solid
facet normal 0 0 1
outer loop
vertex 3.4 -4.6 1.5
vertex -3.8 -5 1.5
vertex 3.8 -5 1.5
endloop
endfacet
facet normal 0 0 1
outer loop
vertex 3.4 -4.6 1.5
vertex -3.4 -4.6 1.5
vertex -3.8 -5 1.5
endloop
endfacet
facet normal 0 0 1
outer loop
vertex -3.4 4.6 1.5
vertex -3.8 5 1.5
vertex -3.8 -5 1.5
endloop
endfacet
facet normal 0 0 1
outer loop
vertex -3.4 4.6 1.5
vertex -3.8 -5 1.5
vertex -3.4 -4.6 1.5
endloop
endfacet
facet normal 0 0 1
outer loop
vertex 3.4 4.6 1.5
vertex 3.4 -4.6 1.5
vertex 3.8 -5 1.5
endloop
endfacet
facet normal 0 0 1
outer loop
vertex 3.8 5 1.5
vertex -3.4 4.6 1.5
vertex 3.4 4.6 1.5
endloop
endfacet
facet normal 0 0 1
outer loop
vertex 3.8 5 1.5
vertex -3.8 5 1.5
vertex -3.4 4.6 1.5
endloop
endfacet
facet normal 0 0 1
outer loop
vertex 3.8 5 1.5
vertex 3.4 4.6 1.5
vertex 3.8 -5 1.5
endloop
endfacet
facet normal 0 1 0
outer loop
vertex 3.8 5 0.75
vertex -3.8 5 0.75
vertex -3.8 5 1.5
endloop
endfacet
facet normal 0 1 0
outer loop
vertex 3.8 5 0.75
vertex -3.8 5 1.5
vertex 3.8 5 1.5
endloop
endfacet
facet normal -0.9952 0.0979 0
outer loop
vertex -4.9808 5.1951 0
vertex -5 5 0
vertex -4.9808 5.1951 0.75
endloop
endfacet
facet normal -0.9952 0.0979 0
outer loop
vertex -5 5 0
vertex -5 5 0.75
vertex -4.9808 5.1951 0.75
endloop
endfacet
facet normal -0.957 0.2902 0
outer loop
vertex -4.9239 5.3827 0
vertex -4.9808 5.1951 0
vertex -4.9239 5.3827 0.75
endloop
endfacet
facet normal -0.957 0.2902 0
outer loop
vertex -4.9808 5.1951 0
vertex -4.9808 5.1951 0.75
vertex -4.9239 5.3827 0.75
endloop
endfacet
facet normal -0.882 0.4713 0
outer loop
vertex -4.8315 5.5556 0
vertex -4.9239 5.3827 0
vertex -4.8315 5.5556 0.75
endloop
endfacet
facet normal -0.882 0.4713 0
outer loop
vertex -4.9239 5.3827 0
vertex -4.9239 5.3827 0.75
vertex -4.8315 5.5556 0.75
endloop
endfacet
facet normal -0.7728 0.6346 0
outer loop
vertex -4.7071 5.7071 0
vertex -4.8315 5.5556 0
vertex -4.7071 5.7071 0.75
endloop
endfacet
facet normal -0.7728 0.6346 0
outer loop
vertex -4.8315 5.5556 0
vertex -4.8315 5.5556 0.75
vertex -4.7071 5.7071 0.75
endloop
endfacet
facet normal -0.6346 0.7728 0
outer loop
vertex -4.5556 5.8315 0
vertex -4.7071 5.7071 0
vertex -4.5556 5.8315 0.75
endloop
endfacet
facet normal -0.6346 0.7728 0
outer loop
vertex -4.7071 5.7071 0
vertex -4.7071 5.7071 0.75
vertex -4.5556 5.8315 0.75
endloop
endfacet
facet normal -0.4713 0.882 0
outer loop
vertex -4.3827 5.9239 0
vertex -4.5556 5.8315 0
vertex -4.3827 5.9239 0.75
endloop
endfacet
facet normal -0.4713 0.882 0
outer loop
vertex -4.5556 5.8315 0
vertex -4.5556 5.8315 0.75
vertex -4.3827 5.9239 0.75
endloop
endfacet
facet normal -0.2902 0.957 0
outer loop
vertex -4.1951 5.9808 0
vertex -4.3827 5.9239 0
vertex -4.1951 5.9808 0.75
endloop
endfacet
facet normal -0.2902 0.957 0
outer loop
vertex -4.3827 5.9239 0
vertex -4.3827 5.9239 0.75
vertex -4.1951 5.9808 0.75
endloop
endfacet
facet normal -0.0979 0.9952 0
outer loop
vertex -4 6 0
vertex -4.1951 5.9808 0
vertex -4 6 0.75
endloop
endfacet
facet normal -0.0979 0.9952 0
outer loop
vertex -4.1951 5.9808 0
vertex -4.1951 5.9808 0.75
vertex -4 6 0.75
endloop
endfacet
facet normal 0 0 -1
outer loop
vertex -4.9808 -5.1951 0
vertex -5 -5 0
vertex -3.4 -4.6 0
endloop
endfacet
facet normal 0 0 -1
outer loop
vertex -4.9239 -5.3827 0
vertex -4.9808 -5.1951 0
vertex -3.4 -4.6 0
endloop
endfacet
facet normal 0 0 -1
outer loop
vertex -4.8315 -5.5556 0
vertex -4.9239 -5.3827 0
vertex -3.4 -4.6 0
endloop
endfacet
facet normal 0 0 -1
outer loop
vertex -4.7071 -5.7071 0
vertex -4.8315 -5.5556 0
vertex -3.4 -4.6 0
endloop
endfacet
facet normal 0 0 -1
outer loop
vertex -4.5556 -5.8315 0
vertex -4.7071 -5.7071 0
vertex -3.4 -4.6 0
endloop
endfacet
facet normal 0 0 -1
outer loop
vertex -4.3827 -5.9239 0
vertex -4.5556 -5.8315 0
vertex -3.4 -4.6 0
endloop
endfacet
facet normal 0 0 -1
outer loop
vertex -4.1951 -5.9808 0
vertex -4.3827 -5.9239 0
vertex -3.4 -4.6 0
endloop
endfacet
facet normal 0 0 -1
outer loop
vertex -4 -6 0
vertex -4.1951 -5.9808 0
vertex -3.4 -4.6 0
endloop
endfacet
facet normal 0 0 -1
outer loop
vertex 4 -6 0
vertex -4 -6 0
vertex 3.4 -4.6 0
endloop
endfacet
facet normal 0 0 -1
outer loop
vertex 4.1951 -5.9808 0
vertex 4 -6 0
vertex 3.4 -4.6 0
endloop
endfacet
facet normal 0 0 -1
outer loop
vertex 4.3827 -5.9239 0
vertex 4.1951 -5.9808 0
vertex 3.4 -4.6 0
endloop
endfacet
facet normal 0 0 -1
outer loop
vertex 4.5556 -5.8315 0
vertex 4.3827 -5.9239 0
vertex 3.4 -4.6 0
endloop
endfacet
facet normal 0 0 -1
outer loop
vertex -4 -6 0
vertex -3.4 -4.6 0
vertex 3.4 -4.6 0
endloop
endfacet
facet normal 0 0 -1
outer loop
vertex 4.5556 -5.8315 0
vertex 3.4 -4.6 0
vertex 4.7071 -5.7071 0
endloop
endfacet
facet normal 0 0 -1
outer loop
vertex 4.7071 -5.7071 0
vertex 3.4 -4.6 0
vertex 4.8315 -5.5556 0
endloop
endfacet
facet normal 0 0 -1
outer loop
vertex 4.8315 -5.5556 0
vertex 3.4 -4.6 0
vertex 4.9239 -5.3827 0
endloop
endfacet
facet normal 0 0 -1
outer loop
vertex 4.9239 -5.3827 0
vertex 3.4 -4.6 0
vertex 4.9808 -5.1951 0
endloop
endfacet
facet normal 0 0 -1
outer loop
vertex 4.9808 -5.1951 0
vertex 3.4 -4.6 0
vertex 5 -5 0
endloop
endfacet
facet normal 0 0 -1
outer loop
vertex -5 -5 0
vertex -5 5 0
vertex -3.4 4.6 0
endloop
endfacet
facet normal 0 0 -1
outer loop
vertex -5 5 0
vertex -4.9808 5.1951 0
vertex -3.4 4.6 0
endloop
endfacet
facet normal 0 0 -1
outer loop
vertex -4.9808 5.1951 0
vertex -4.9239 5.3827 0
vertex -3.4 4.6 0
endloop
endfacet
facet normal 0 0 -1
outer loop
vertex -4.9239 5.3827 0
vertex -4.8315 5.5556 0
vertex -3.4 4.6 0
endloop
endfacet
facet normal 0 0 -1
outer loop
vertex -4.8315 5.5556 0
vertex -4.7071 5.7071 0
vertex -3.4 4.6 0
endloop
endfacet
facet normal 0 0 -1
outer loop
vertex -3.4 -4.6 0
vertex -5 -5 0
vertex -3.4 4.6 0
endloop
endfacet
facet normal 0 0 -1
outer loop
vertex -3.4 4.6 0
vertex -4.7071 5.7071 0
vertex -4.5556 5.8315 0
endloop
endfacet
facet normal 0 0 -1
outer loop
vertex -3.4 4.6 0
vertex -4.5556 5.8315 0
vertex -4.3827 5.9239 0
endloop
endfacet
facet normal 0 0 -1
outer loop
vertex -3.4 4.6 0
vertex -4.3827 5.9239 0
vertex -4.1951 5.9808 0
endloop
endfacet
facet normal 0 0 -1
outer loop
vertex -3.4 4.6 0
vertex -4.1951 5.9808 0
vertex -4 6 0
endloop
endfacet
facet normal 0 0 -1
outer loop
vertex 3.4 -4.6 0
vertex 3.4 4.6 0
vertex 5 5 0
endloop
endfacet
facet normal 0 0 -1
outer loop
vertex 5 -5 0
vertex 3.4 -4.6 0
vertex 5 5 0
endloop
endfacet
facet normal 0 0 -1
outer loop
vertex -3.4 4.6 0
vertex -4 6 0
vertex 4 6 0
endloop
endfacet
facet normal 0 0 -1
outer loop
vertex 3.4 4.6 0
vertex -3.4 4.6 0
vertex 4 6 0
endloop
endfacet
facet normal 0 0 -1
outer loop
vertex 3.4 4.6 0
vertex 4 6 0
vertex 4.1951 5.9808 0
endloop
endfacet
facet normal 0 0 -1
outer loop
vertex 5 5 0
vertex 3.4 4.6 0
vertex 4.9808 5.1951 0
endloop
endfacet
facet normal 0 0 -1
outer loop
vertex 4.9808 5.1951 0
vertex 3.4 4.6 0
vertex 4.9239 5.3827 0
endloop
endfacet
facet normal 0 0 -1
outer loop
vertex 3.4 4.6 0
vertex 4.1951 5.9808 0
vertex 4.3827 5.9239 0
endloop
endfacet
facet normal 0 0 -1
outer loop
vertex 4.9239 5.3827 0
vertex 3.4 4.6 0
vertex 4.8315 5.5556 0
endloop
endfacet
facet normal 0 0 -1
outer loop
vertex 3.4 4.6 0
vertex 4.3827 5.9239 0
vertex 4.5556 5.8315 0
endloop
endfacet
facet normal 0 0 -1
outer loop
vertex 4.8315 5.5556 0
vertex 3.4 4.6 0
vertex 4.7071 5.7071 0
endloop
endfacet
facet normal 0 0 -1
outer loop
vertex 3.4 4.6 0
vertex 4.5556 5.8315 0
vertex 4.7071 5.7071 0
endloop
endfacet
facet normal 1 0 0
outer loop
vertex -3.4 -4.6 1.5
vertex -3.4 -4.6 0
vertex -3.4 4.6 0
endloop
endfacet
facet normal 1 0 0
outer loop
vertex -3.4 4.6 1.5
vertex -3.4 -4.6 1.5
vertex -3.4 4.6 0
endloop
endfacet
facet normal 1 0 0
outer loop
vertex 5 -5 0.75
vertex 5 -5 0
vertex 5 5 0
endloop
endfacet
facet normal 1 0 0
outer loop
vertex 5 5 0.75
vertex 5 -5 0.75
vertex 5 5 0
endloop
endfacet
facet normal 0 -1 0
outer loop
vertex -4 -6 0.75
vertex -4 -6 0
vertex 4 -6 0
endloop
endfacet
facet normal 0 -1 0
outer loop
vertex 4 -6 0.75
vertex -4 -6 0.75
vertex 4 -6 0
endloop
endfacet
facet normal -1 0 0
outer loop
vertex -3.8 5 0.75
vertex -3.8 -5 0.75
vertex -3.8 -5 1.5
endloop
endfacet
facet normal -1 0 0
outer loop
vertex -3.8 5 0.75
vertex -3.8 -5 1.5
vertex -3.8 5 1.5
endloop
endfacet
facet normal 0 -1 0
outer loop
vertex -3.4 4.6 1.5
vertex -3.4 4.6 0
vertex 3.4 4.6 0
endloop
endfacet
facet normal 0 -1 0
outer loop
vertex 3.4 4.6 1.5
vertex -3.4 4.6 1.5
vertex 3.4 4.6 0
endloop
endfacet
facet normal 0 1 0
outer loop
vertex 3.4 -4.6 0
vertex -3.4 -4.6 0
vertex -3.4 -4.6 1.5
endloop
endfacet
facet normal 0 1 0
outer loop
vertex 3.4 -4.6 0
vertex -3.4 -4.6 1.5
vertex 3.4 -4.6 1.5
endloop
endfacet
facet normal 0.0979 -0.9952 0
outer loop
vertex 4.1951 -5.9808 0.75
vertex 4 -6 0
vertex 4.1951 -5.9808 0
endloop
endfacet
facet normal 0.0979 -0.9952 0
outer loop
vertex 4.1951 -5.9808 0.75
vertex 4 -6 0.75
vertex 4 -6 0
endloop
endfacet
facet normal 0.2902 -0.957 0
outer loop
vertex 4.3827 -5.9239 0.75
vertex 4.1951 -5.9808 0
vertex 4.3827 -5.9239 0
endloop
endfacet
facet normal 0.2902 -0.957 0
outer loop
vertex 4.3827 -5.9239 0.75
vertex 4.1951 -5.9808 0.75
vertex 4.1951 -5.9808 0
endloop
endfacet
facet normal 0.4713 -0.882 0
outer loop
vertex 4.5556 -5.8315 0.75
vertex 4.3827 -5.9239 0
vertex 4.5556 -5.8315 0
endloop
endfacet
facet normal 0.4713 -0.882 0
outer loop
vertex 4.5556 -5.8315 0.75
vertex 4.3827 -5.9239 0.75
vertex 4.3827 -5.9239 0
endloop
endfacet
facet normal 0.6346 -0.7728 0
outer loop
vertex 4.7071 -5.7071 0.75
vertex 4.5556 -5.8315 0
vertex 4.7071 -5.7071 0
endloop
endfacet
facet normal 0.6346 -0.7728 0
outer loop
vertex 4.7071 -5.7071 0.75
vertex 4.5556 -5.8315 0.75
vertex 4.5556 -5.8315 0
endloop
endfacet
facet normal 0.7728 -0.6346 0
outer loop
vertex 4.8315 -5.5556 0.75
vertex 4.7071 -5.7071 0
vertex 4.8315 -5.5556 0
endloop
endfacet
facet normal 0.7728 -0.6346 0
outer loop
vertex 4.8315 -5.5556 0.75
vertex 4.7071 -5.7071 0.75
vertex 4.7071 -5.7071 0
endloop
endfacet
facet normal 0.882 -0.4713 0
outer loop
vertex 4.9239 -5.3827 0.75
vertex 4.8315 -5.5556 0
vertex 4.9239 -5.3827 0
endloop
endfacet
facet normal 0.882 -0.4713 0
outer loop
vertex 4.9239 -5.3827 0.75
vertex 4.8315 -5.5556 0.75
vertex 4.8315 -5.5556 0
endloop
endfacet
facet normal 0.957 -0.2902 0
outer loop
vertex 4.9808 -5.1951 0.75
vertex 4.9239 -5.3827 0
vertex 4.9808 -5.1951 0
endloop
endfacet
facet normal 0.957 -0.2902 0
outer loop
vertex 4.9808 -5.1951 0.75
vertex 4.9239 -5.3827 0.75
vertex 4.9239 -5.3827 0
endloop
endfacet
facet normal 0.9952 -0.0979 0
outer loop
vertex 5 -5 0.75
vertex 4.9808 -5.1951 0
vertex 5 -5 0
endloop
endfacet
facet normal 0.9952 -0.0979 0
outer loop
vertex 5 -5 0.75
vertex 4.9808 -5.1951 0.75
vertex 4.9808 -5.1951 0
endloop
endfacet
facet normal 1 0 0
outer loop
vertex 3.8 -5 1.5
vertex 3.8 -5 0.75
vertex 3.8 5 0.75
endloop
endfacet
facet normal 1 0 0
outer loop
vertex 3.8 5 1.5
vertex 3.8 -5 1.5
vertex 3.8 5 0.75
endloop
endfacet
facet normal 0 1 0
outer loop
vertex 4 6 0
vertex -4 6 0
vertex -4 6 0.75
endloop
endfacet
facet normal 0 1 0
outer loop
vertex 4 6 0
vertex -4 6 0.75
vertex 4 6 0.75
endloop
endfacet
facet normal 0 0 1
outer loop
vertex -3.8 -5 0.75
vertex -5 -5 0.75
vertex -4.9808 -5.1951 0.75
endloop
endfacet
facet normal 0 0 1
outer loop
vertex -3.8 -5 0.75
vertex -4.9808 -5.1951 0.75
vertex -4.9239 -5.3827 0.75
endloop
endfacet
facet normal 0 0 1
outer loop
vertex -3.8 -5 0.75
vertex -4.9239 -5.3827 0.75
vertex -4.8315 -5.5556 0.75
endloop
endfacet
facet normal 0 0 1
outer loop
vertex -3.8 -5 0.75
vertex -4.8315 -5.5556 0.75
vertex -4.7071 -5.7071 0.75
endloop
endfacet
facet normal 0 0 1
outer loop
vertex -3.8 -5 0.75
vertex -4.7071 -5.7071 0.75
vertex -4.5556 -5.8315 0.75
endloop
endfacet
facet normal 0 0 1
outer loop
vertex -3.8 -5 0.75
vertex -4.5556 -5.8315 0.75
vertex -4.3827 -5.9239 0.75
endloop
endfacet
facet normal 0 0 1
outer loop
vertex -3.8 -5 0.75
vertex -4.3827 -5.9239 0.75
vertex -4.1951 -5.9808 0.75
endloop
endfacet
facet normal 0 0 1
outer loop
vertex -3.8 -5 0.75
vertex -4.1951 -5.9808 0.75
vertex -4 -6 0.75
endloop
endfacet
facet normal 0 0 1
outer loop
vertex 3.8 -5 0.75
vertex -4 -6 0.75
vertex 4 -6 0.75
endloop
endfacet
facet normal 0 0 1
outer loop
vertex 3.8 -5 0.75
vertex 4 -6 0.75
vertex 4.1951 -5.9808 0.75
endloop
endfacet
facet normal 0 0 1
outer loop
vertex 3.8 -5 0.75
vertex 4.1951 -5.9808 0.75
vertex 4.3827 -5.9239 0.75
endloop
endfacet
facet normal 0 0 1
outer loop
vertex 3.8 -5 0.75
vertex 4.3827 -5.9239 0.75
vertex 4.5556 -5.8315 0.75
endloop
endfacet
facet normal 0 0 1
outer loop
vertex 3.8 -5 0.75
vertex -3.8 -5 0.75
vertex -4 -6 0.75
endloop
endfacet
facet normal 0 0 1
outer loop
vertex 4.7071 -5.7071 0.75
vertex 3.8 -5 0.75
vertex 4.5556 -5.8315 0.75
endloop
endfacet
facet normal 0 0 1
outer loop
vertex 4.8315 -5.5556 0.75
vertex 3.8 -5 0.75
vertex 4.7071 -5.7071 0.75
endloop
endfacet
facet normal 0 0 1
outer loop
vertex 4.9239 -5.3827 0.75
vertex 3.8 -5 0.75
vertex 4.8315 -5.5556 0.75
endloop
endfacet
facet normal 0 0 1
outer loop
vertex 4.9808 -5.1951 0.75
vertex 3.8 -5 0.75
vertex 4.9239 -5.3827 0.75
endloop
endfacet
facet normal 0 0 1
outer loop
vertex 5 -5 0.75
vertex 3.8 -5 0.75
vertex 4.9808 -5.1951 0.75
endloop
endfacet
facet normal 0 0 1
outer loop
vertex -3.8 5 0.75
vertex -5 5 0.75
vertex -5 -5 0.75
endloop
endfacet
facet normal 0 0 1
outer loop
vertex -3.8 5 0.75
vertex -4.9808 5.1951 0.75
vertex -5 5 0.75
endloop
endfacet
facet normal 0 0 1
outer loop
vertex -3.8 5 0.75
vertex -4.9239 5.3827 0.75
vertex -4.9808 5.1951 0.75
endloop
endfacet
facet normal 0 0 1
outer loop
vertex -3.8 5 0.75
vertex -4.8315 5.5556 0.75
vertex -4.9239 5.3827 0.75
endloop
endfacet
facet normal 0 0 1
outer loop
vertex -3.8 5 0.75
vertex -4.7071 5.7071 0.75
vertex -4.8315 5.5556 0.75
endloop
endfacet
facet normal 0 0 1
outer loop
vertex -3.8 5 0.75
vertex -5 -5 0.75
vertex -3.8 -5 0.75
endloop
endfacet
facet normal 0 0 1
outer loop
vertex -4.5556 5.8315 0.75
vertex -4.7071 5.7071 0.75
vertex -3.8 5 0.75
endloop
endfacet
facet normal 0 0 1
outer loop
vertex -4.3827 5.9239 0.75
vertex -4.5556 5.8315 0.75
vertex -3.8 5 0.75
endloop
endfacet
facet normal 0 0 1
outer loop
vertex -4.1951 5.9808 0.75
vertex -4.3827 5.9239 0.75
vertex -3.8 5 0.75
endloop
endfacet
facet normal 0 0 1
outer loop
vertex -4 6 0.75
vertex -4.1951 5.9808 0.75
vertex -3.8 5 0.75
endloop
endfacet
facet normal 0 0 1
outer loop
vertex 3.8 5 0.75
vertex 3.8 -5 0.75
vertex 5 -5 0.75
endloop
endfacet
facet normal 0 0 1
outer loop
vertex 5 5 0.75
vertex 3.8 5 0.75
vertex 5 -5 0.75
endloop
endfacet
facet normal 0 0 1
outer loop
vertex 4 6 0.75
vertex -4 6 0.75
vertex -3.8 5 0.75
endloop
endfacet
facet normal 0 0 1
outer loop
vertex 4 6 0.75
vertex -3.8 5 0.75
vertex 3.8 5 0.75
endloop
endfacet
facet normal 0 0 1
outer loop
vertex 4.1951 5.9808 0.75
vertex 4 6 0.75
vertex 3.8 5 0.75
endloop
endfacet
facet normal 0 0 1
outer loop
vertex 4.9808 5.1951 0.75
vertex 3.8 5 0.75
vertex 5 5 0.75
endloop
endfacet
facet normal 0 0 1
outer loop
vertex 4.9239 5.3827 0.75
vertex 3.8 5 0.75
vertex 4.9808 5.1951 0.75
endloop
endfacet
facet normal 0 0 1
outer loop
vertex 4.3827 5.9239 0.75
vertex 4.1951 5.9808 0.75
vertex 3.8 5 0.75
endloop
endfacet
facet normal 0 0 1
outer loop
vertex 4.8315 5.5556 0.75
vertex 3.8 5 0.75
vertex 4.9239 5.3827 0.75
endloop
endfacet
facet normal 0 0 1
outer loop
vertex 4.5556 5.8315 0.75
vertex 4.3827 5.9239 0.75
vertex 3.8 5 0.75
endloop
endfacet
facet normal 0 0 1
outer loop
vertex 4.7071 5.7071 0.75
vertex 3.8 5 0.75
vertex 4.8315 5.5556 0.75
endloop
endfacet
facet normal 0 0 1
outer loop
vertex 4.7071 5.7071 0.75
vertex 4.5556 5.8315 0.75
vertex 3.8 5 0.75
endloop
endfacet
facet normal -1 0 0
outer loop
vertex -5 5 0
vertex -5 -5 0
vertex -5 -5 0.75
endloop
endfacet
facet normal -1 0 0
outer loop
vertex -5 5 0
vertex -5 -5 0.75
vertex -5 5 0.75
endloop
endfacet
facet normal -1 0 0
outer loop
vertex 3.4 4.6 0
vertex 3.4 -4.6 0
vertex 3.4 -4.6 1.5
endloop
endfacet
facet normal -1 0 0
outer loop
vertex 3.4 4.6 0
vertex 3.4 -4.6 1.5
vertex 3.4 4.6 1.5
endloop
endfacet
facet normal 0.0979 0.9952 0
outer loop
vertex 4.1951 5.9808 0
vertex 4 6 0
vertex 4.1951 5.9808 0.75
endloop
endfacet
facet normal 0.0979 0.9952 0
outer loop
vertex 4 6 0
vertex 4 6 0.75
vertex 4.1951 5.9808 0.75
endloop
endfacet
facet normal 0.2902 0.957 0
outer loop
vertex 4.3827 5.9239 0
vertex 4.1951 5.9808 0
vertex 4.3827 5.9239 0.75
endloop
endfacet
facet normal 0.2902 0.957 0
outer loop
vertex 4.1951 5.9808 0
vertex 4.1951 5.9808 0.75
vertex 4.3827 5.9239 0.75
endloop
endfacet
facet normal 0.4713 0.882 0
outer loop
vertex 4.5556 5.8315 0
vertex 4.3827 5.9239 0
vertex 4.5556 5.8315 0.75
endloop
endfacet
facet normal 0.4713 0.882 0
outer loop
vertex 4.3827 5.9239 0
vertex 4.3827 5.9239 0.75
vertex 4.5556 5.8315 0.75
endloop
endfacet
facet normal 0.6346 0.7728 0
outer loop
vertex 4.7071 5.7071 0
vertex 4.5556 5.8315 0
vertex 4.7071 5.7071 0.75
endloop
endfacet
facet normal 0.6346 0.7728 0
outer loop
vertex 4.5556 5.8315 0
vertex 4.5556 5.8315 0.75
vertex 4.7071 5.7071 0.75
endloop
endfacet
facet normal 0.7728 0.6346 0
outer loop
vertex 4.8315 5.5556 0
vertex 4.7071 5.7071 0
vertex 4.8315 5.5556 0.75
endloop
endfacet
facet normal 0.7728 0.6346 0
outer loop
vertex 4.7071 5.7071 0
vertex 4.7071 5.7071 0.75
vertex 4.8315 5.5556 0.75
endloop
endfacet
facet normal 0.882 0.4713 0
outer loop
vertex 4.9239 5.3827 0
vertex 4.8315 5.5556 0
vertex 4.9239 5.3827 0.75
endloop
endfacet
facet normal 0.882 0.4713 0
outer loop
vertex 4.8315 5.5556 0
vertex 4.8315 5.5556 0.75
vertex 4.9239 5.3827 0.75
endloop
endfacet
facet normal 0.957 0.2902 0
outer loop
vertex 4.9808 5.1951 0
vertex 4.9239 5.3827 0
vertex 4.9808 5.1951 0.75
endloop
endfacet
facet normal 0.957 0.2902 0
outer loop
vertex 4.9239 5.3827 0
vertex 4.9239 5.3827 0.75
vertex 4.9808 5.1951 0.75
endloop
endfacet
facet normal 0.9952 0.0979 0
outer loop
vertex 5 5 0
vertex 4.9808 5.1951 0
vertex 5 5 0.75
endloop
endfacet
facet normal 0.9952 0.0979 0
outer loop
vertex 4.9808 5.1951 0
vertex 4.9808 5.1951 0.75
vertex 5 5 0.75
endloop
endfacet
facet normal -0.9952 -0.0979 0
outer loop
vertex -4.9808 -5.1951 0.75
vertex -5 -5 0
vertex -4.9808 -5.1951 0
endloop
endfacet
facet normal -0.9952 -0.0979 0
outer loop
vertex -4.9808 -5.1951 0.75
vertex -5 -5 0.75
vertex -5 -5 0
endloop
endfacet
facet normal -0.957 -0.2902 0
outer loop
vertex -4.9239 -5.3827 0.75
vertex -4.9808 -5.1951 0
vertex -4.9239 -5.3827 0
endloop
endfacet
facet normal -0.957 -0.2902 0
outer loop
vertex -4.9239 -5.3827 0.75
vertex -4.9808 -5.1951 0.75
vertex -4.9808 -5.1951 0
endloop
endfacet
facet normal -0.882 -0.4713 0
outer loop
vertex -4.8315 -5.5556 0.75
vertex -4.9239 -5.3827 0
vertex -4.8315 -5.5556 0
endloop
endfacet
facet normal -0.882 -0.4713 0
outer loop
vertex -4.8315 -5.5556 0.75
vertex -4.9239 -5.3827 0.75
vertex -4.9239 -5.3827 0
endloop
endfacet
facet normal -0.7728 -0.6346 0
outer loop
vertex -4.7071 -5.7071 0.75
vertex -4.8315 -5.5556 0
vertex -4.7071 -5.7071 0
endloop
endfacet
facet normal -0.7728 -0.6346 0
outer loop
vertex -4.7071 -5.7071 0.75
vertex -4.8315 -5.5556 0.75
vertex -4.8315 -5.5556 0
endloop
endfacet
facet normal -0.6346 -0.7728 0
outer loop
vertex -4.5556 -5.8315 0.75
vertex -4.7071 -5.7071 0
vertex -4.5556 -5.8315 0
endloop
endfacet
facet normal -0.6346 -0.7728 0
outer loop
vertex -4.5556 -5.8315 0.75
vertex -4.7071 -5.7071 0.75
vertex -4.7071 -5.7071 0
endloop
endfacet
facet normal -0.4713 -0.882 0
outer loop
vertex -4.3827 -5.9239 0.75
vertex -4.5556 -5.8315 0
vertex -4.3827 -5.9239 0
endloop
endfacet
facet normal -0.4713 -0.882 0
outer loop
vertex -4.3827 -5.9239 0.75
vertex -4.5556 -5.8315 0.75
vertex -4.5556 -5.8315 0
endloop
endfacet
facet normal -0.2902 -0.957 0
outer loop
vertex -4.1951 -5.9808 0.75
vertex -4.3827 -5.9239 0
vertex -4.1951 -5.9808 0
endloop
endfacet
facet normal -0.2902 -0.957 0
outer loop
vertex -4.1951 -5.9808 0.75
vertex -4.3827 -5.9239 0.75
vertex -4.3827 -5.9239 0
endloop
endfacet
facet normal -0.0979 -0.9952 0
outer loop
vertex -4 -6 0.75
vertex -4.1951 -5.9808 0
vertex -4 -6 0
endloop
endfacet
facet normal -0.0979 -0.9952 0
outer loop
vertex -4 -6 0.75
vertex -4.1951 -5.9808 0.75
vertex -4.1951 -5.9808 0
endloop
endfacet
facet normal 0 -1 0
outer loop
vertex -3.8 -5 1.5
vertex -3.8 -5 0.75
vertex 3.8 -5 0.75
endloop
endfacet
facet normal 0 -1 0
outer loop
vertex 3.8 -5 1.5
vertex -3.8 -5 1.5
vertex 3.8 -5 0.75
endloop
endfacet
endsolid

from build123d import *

# Parameters (mm, degrees)
F0_W     = 10
F0_H     = 12
F0_W_2   = 7.6
F0_H_2   = 10
F1_DEPTH = 0.75
F0_W_3   = 6.8
F0_H_3   = 9.2
F2_DEPTH = 1.5
F3_R     = 1


with BuildPart() as f1:
    # F0 (on Top) → F1 (new body)
    with BuildSketch(Plane.XY):
        Rectangle(F0_W, F0_H)
        Rectangle(F0_W_2, F0_H_2, mode=Mode.SUBTRACT)
    extrude(amount=F1_DEPTH)

    # F0 (on Top) → F2 (join)
    with BuildSketch(Plane.XY):
        Rectangle(F0_W_2, F0_H_2)
        Rectangle(F0_W_3, F0_H_3, mode=Mode.SUBTRACT)
    extrude(amount=F2_DEPTH)

    # F3
    f3_edges = [f1.edges().sort_by_distance(p)[0] for p in [
        (5, 6, 0.375),
        (-5, 6, 0.375),
        (-5, -6, 0.375),
        (5, -6, 0.375),
    ]]
    fillet(f3_edges, radius=F3_R)


solid = f1.part
